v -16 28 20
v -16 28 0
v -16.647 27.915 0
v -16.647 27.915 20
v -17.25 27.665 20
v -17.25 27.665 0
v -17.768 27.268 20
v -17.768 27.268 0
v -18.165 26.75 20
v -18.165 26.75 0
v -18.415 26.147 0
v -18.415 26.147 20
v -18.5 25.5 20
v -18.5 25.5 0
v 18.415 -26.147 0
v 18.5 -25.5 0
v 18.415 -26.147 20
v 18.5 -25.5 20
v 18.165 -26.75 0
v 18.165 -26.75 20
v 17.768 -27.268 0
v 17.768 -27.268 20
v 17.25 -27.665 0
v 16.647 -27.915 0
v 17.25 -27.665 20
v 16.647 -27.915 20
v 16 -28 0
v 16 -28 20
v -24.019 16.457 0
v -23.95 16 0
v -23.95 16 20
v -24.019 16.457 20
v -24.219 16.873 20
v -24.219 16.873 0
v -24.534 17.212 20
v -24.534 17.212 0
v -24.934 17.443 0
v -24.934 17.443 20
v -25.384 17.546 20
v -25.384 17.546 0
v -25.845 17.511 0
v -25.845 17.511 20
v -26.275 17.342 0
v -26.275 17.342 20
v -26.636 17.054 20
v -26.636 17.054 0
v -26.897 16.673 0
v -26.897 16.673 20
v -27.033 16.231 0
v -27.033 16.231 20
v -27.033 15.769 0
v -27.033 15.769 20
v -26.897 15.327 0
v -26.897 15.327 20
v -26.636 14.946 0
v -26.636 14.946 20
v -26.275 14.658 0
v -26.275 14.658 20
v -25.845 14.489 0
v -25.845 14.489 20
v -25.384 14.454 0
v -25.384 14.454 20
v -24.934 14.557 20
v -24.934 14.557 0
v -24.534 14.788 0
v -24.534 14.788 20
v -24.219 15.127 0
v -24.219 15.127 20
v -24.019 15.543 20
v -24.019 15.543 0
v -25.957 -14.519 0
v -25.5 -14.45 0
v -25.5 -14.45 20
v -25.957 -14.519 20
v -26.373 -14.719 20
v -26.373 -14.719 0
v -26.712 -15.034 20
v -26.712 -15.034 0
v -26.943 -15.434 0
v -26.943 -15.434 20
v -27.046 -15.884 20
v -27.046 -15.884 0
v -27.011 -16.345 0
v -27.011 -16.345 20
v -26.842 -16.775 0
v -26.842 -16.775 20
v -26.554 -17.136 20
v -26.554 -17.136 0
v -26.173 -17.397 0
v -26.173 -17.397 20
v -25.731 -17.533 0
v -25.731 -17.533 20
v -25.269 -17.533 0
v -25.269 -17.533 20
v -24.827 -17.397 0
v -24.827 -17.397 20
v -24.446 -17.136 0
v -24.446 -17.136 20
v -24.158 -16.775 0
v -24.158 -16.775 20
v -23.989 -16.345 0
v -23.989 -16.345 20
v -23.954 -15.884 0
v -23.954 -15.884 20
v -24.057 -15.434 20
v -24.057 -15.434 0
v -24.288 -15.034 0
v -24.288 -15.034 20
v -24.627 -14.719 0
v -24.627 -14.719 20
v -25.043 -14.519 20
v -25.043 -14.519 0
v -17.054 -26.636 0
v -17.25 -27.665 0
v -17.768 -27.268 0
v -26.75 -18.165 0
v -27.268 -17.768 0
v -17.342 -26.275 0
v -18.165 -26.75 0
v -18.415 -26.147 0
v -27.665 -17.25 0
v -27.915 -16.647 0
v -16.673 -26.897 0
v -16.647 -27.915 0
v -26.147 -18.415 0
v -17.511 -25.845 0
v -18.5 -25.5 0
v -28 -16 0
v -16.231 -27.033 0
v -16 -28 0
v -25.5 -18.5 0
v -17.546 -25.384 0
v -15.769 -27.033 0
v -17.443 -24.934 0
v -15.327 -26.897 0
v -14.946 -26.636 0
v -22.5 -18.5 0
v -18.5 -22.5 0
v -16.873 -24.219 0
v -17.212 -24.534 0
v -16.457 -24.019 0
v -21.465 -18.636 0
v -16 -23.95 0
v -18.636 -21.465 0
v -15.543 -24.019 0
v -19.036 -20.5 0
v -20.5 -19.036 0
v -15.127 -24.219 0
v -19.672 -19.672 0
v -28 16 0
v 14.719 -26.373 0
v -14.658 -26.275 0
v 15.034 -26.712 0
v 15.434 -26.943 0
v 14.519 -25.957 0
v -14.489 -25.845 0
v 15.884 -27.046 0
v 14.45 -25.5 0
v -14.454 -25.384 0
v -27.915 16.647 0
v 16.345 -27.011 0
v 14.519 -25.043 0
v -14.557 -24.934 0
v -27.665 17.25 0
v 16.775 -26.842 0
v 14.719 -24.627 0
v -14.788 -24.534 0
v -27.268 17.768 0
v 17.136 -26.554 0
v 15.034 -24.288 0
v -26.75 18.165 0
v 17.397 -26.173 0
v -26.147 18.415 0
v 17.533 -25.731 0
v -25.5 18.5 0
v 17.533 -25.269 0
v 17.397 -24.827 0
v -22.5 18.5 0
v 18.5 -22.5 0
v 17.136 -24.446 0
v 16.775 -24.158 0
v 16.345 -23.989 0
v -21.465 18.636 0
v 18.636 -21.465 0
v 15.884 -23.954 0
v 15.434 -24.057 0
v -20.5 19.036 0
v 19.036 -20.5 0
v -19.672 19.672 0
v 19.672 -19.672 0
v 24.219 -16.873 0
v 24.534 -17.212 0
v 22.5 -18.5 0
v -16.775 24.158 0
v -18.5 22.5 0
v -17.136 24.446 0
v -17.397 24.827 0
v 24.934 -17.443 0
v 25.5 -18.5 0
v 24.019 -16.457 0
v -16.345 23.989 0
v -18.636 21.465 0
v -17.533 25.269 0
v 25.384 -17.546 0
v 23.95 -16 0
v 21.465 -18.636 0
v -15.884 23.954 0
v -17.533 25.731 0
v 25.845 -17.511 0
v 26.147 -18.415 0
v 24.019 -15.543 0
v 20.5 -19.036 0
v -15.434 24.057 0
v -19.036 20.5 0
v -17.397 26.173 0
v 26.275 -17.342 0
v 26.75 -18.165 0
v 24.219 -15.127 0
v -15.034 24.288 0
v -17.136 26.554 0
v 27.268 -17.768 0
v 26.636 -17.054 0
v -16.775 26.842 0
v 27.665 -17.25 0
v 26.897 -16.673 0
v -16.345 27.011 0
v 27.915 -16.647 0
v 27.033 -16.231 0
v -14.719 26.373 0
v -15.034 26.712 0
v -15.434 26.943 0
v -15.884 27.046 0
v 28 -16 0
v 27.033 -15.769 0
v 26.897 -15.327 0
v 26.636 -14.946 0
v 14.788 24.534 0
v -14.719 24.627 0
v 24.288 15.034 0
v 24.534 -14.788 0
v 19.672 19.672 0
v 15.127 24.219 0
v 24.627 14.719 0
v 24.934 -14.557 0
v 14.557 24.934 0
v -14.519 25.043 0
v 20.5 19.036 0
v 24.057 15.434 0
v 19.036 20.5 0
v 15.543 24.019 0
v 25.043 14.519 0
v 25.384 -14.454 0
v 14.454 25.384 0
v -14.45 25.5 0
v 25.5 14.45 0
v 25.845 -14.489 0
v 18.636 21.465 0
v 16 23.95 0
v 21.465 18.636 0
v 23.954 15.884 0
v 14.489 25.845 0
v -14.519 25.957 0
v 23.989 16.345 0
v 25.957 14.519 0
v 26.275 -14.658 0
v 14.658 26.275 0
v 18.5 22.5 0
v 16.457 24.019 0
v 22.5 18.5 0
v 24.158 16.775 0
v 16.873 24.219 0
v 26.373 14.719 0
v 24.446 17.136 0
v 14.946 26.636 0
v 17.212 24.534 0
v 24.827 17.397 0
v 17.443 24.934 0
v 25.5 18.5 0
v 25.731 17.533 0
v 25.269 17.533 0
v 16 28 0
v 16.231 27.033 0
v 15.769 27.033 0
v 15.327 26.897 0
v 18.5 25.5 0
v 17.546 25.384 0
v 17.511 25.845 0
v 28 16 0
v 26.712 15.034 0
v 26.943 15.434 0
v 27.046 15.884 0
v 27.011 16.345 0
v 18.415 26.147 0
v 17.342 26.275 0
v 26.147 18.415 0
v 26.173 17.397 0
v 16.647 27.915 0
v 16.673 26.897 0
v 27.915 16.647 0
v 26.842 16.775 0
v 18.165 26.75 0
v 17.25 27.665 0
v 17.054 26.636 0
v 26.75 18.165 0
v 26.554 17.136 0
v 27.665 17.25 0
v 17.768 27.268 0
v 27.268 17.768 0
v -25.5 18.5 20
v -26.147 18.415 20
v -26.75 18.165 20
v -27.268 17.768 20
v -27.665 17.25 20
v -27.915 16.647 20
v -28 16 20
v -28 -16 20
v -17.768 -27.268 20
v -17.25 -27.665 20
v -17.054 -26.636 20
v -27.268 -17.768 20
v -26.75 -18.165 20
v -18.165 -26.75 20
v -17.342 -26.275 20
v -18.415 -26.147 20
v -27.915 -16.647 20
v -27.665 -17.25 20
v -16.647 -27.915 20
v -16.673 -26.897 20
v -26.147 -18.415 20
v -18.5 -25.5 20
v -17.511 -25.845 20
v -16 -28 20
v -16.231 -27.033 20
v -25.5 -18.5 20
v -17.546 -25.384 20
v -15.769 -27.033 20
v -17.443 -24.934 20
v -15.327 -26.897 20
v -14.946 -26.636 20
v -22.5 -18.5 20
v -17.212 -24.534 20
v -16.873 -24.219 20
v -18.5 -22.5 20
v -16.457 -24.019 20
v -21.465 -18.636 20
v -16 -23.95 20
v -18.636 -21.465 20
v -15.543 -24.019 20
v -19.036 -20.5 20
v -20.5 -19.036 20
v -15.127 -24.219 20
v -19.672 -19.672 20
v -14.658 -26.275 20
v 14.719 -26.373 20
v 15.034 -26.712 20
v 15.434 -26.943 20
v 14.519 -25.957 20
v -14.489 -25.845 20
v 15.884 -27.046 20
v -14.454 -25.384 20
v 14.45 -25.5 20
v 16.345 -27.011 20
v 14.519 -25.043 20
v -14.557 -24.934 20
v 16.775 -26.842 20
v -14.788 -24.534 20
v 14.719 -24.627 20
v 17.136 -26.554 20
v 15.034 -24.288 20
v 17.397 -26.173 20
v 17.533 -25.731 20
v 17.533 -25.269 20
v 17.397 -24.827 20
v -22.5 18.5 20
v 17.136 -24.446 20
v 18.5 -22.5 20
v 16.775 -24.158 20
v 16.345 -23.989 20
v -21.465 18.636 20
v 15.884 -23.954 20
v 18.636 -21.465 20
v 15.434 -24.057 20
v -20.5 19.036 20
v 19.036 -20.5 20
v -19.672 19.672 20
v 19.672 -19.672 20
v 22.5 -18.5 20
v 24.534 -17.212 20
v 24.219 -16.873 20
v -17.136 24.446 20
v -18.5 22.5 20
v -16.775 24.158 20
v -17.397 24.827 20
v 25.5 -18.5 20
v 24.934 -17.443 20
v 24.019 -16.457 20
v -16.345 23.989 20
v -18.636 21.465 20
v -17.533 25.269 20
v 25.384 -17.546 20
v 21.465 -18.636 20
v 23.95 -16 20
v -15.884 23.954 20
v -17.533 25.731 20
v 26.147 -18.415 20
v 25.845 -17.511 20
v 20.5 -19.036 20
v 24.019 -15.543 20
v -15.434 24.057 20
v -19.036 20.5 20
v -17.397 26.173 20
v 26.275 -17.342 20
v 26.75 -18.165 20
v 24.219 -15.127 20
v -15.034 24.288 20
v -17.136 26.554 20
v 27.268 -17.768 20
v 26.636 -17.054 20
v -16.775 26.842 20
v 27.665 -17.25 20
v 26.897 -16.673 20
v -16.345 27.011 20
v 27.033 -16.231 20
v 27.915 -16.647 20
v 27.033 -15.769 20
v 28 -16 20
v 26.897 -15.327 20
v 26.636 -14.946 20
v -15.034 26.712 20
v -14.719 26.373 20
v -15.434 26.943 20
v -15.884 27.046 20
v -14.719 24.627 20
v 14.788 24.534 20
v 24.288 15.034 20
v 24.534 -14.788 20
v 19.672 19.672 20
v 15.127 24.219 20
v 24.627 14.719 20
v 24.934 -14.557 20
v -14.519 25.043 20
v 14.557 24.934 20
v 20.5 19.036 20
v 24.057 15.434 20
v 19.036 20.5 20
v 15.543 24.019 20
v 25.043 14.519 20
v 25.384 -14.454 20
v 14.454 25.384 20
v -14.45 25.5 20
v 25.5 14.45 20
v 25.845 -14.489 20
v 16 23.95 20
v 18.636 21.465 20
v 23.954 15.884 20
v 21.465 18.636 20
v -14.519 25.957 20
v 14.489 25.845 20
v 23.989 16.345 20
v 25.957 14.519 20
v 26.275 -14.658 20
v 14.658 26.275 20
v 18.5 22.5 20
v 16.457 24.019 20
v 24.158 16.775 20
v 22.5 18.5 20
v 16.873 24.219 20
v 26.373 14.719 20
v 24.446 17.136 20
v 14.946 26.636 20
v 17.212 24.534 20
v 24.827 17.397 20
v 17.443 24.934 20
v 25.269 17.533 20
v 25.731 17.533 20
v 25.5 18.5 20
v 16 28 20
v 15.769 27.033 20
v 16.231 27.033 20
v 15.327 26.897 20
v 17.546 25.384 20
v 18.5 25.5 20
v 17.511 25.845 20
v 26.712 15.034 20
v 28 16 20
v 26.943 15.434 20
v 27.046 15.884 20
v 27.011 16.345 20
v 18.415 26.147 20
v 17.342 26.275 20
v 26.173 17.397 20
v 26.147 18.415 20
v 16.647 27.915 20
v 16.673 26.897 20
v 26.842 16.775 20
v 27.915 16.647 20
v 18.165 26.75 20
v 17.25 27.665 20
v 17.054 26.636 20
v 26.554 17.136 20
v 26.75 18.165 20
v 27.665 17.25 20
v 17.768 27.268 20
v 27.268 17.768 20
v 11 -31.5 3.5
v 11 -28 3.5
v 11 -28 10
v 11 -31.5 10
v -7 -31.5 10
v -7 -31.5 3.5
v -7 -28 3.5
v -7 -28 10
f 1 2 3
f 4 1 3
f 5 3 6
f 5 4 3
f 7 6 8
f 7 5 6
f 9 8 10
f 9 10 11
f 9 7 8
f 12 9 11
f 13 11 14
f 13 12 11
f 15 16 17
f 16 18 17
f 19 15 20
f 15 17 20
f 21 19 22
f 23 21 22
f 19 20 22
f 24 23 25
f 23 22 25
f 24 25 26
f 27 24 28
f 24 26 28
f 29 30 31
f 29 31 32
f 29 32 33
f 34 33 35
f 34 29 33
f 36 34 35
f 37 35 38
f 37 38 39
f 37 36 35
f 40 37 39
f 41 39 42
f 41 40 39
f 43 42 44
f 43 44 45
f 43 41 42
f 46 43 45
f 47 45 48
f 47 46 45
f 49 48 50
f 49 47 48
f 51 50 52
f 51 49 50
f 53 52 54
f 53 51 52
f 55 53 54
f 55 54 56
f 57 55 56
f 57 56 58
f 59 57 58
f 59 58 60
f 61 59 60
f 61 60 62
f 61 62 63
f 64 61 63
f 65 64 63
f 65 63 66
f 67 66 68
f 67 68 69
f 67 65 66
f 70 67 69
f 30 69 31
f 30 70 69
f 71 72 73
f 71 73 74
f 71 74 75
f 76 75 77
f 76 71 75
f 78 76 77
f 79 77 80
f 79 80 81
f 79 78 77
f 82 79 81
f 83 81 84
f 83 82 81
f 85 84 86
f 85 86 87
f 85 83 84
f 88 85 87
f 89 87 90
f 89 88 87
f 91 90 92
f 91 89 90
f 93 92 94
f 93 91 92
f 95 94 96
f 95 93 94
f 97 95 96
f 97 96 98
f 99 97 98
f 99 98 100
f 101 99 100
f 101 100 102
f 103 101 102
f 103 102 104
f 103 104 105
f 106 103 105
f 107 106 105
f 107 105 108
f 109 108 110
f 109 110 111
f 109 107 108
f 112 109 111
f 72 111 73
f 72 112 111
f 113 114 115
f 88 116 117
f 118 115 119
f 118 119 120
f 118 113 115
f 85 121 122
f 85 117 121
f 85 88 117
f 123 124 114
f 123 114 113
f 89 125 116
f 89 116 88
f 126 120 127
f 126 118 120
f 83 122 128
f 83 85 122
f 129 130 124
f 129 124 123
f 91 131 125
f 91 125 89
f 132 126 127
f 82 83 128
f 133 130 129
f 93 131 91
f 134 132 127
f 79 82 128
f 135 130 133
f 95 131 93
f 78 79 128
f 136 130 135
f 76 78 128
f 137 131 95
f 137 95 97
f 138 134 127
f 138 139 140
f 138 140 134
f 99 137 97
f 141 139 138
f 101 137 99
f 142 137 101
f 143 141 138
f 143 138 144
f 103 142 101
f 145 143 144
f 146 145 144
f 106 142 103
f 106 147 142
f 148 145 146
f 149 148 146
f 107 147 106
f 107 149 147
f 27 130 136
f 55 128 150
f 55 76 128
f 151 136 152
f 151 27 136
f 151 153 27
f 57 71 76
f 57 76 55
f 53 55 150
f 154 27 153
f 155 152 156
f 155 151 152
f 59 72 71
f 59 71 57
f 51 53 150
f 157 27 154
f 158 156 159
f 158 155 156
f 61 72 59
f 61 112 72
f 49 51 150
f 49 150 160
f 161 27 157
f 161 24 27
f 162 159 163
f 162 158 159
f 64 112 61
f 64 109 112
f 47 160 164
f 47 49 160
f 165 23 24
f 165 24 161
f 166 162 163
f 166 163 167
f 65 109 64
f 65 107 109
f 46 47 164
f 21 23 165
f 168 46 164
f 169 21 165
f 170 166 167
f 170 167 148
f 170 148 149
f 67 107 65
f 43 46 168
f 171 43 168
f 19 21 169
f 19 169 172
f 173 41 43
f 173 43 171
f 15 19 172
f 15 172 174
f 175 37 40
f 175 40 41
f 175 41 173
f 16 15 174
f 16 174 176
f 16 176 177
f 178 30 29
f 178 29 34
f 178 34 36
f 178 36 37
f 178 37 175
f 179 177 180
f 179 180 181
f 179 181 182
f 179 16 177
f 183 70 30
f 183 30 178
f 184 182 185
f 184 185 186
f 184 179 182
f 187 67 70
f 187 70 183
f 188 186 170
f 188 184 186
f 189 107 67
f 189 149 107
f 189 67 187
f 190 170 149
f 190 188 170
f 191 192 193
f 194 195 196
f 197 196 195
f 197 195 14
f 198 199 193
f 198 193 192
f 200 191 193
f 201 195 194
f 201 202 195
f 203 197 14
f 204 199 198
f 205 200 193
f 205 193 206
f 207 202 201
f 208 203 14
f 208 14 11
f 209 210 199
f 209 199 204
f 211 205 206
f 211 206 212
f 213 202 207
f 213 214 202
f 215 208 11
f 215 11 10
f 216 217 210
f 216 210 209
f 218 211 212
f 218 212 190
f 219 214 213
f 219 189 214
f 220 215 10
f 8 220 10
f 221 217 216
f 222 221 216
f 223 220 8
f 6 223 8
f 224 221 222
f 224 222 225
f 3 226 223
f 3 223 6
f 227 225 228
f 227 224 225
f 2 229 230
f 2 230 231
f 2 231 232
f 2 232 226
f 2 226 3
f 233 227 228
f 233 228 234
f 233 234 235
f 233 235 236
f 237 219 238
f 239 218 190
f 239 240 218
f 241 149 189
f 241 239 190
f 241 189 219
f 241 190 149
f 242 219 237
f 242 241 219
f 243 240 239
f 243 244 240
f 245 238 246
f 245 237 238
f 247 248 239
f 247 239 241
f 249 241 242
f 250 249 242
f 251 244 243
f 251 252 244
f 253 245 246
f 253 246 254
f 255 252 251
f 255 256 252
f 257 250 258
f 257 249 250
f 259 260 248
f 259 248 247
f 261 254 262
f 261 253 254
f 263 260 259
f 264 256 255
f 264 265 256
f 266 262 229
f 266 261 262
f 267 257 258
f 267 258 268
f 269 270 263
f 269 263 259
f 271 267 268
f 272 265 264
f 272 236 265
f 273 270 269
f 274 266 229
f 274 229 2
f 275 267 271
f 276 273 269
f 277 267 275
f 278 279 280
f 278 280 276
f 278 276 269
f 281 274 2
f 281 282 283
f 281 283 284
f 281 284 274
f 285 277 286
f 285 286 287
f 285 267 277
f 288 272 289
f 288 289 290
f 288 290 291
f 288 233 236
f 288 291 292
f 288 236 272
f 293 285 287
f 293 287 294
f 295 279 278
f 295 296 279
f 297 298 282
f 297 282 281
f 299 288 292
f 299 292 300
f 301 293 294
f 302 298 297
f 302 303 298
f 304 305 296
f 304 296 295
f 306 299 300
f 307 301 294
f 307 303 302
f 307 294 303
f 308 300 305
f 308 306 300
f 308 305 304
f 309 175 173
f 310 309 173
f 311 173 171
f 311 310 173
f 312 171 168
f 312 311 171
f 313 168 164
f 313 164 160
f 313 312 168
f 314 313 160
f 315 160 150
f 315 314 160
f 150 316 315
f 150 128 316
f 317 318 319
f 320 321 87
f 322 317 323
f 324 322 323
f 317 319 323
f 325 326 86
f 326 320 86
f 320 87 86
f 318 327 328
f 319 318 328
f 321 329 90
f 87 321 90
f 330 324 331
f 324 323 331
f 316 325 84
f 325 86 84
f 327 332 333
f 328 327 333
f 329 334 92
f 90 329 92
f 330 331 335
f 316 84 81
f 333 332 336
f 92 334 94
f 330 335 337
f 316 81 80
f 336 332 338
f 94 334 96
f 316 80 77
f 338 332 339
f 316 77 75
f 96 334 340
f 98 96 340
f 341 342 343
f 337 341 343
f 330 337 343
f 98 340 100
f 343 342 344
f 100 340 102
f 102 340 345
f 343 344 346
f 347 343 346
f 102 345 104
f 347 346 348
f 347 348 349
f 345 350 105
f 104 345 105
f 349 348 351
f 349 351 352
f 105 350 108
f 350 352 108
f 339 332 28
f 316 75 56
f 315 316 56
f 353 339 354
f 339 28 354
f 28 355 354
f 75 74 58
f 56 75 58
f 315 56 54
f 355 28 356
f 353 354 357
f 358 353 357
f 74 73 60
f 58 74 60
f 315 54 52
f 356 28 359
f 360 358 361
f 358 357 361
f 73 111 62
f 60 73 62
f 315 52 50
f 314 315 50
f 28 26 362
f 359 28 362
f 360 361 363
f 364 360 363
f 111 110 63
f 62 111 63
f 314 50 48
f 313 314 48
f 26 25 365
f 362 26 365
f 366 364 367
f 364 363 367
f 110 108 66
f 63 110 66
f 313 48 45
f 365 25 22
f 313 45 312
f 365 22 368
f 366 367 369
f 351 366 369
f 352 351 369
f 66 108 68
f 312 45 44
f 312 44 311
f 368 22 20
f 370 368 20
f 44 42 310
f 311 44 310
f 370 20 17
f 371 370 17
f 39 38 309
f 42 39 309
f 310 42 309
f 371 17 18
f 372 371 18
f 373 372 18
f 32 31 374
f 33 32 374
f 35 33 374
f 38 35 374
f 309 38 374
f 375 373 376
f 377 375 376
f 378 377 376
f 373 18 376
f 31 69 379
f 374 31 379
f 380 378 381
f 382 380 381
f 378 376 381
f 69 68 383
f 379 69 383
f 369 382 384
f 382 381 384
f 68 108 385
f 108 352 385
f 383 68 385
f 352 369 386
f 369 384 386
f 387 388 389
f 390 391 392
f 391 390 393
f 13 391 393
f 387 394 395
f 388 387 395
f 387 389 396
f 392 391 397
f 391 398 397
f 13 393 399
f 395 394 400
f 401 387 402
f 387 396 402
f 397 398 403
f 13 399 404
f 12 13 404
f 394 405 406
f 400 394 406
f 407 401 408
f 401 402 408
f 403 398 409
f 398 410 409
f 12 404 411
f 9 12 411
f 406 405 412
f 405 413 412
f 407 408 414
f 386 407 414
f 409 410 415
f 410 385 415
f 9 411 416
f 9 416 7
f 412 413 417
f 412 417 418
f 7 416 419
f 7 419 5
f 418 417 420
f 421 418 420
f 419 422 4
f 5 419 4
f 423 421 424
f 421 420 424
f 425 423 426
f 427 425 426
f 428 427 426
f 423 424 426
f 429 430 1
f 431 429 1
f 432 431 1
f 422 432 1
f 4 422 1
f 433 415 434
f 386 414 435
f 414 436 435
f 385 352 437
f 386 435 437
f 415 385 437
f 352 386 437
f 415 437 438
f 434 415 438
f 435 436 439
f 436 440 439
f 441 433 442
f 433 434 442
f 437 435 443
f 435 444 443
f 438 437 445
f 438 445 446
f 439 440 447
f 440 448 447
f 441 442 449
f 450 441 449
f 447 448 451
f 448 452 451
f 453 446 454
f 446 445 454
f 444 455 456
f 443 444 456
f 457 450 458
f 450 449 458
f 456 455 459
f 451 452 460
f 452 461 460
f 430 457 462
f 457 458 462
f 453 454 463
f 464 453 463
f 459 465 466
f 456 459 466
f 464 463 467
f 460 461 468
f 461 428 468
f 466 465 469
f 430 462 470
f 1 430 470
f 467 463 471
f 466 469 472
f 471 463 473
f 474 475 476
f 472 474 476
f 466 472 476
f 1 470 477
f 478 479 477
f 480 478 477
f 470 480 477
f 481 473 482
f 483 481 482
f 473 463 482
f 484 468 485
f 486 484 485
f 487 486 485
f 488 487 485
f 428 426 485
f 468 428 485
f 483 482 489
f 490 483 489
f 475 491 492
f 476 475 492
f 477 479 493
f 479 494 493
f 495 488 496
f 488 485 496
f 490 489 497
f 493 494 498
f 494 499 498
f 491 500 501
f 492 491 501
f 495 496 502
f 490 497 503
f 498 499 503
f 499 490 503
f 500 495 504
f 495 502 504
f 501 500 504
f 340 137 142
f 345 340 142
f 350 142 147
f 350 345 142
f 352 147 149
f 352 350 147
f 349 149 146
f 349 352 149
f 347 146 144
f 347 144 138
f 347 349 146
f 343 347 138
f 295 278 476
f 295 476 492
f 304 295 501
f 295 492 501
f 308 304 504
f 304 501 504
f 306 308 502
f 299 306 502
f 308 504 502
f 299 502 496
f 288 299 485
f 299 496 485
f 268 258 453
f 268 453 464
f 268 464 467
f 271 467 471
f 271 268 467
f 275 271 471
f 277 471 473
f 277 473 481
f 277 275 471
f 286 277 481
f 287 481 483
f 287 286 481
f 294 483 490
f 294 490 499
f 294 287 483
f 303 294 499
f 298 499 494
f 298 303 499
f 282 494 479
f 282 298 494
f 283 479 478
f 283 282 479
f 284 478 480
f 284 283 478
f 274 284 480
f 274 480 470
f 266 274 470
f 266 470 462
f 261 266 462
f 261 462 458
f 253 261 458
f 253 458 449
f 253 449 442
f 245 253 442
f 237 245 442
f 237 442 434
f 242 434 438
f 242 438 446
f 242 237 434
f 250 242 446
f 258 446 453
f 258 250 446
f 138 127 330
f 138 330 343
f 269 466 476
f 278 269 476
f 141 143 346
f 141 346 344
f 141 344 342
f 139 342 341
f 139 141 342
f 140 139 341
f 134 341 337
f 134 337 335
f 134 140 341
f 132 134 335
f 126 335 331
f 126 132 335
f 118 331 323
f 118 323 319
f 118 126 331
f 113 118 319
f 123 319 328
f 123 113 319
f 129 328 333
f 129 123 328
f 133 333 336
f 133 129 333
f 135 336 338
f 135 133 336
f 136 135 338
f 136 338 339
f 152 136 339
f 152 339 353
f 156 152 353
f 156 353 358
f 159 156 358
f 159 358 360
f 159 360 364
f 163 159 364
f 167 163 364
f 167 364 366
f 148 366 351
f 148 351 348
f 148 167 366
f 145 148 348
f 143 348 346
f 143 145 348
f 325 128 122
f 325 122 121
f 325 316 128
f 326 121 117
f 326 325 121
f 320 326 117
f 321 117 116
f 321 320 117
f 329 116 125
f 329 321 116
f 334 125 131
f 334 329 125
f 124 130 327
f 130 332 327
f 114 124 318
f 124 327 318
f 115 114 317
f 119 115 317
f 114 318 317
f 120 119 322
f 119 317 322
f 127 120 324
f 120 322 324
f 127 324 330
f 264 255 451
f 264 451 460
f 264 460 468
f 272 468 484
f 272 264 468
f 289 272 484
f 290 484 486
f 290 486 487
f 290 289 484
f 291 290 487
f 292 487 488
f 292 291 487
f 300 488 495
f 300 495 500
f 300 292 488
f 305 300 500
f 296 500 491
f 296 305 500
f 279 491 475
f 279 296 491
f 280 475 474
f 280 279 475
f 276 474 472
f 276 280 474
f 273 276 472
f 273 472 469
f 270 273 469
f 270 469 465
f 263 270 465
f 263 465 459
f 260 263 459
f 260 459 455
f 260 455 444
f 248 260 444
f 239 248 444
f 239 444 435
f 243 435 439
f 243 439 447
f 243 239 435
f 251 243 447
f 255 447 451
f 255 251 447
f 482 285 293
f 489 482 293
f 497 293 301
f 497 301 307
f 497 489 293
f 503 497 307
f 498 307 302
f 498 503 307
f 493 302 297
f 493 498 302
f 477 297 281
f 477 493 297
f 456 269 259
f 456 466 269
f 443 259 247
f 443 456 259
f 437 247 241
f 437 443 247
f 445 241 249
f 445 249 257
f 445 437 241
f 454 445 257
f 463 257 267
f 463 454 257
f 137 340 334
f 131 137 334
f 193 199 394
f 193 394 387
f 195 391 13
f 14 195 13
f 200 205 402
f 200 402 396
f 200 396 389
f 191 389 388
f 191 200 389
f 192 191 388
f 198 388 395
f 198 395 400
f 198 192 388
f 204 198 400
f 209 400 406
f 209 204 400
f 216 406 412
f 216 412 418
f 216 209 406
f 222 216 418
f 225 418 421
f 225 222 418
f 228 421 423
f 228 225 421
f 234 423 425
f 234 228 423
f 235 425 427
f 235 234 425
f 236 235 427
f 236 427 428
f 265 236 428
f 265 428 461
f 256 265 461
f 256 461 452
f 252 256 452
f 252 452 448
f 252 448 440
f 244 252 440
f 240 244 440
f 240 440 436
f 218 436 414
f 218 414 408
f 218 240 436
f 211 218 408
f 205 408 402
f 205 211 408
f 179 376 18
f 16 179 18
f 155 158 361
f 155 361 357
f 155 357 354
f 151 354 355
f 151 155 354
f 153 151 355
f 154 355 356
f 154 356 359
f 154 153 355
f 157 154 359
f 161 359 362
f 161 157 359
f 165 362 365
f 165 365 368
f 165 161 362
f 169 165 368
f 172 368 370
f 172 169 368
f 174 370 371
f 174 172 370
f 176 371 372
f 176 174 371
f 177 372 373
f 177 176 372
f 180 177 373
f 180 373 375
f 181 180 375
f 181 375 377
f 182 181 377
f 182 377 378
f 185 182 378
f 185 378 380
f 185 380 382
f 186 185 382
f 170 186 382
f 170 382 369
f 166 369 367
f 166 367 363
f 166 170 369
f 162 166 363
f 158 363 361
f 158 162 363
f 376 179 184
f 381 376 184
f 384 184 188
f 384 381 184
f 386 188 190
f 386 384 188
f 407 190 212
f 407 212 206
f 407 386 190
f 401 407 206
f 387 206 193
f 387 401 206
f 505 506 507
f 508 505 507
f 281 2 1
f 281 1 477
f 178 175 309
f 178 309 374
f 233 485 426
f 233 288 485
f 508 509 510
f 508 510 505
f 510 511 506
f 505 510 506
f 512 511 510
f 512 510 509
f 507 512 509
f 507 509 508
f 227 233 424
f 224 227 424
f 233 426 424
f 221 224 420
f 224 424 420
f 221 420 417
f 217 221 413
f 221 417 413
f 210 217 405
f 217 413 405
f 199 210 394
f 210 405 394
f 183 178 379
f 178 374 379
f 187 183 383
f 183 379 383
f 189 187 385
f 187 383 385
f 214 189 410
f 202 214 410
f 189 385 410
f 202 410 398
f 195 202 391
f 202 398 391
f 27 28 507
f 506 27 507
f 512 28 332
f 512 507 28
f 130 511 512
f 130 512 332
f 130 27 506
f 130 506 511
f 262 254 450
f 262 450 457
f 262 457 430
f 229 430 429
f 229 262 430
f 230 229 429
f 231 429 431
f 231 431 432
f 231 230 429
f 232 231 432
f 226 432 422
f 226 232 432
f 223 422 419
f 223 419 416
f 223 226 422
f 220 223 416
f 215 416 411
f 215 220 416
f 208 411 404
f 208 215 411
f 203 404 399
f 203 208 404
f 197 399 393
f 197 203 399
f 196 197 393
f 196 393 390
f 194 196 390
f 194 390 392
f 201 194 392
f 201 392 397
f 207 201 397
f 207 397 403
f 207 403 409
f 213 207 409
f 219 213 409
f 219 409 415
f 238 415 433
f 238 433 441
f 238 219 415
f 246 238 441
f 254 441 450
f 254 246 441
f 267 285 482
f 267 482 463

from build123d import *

# Parameters (mm, degrees)
SKETCH_R              = 1.55
PAD_DEPTH             = 20
POLARPATTERN012_COUNT = 4
FILLET004_R           = 4
FILLET005_R           = 2.5
SKETCH019_W           = 18
SKETCH019_H           = 6.5
PAD012_DEPTH          = 31.5


with BuildPart() as part:
    # Sketch → Pad (new body)
    with BuildSketch(Plane.XY):
        Polygon((-28, 0), (-28, 18.5), (-18.5, 18.5), (-18.5, 28), (0, 28), (0, 0), align=None)
        with Locations((-16, 25.5)):
            Circle(SKETCH_R, mode=Mode.SUBTRACT)
        with Locations((-25.5, 16)):
            Circle(SKETCH_R, mode=Mode.SUBTRACT)
    pad = extrude(amount=PAD_DEPTH)

    # PolarPattern012: Pad ×4 about axis
    polarpattern012_axis = Axis((0, 0, 0), (0, 0, 1))
    for i in range(1, POLARPATTERN012_COUNT):
        add(pad.rotate(polarpattern012_axis, i * 360 / POLARPATTERN012_COUNT))

    # Fillet004
    fillet004_edges = [part.edges().sort_by_distance(p)[0] for p in [
        (-18.5, 18.5, 10),
        (18.5, -18.5, 10),
        (-18.5, -18.5, 10),
        (18.5, 18.5, 10),
    ]]
    fillet(fillet004_edges, radius=FILLET004_R)

    # Fillet005
    fillet005_edges = [part.edges().sort_by_distance(p)[0] for p in [
        (-28, -18.5, 10),
        (-18.5, -28, 10),
        (18.5, -28, 10),
        (28, -18.5, 10),
        (28, 18.5, 10),
        (18.5, 28, 10),
        (-18.5, 28, 10),
        (-28, 18.5, 10),
    ]]
    fillet(fillet005_edges, radius=FILLET005_R)

    # Sketch019 → Pad012 (join)
    with BuildSketch(Plane.XZ):
        with Locations((2, 6.75)):
            Rectangle(SKETCH019_W, SKETCH019_H)
    extrude(amount=PAD012_DEPTH)


solid = part.part
